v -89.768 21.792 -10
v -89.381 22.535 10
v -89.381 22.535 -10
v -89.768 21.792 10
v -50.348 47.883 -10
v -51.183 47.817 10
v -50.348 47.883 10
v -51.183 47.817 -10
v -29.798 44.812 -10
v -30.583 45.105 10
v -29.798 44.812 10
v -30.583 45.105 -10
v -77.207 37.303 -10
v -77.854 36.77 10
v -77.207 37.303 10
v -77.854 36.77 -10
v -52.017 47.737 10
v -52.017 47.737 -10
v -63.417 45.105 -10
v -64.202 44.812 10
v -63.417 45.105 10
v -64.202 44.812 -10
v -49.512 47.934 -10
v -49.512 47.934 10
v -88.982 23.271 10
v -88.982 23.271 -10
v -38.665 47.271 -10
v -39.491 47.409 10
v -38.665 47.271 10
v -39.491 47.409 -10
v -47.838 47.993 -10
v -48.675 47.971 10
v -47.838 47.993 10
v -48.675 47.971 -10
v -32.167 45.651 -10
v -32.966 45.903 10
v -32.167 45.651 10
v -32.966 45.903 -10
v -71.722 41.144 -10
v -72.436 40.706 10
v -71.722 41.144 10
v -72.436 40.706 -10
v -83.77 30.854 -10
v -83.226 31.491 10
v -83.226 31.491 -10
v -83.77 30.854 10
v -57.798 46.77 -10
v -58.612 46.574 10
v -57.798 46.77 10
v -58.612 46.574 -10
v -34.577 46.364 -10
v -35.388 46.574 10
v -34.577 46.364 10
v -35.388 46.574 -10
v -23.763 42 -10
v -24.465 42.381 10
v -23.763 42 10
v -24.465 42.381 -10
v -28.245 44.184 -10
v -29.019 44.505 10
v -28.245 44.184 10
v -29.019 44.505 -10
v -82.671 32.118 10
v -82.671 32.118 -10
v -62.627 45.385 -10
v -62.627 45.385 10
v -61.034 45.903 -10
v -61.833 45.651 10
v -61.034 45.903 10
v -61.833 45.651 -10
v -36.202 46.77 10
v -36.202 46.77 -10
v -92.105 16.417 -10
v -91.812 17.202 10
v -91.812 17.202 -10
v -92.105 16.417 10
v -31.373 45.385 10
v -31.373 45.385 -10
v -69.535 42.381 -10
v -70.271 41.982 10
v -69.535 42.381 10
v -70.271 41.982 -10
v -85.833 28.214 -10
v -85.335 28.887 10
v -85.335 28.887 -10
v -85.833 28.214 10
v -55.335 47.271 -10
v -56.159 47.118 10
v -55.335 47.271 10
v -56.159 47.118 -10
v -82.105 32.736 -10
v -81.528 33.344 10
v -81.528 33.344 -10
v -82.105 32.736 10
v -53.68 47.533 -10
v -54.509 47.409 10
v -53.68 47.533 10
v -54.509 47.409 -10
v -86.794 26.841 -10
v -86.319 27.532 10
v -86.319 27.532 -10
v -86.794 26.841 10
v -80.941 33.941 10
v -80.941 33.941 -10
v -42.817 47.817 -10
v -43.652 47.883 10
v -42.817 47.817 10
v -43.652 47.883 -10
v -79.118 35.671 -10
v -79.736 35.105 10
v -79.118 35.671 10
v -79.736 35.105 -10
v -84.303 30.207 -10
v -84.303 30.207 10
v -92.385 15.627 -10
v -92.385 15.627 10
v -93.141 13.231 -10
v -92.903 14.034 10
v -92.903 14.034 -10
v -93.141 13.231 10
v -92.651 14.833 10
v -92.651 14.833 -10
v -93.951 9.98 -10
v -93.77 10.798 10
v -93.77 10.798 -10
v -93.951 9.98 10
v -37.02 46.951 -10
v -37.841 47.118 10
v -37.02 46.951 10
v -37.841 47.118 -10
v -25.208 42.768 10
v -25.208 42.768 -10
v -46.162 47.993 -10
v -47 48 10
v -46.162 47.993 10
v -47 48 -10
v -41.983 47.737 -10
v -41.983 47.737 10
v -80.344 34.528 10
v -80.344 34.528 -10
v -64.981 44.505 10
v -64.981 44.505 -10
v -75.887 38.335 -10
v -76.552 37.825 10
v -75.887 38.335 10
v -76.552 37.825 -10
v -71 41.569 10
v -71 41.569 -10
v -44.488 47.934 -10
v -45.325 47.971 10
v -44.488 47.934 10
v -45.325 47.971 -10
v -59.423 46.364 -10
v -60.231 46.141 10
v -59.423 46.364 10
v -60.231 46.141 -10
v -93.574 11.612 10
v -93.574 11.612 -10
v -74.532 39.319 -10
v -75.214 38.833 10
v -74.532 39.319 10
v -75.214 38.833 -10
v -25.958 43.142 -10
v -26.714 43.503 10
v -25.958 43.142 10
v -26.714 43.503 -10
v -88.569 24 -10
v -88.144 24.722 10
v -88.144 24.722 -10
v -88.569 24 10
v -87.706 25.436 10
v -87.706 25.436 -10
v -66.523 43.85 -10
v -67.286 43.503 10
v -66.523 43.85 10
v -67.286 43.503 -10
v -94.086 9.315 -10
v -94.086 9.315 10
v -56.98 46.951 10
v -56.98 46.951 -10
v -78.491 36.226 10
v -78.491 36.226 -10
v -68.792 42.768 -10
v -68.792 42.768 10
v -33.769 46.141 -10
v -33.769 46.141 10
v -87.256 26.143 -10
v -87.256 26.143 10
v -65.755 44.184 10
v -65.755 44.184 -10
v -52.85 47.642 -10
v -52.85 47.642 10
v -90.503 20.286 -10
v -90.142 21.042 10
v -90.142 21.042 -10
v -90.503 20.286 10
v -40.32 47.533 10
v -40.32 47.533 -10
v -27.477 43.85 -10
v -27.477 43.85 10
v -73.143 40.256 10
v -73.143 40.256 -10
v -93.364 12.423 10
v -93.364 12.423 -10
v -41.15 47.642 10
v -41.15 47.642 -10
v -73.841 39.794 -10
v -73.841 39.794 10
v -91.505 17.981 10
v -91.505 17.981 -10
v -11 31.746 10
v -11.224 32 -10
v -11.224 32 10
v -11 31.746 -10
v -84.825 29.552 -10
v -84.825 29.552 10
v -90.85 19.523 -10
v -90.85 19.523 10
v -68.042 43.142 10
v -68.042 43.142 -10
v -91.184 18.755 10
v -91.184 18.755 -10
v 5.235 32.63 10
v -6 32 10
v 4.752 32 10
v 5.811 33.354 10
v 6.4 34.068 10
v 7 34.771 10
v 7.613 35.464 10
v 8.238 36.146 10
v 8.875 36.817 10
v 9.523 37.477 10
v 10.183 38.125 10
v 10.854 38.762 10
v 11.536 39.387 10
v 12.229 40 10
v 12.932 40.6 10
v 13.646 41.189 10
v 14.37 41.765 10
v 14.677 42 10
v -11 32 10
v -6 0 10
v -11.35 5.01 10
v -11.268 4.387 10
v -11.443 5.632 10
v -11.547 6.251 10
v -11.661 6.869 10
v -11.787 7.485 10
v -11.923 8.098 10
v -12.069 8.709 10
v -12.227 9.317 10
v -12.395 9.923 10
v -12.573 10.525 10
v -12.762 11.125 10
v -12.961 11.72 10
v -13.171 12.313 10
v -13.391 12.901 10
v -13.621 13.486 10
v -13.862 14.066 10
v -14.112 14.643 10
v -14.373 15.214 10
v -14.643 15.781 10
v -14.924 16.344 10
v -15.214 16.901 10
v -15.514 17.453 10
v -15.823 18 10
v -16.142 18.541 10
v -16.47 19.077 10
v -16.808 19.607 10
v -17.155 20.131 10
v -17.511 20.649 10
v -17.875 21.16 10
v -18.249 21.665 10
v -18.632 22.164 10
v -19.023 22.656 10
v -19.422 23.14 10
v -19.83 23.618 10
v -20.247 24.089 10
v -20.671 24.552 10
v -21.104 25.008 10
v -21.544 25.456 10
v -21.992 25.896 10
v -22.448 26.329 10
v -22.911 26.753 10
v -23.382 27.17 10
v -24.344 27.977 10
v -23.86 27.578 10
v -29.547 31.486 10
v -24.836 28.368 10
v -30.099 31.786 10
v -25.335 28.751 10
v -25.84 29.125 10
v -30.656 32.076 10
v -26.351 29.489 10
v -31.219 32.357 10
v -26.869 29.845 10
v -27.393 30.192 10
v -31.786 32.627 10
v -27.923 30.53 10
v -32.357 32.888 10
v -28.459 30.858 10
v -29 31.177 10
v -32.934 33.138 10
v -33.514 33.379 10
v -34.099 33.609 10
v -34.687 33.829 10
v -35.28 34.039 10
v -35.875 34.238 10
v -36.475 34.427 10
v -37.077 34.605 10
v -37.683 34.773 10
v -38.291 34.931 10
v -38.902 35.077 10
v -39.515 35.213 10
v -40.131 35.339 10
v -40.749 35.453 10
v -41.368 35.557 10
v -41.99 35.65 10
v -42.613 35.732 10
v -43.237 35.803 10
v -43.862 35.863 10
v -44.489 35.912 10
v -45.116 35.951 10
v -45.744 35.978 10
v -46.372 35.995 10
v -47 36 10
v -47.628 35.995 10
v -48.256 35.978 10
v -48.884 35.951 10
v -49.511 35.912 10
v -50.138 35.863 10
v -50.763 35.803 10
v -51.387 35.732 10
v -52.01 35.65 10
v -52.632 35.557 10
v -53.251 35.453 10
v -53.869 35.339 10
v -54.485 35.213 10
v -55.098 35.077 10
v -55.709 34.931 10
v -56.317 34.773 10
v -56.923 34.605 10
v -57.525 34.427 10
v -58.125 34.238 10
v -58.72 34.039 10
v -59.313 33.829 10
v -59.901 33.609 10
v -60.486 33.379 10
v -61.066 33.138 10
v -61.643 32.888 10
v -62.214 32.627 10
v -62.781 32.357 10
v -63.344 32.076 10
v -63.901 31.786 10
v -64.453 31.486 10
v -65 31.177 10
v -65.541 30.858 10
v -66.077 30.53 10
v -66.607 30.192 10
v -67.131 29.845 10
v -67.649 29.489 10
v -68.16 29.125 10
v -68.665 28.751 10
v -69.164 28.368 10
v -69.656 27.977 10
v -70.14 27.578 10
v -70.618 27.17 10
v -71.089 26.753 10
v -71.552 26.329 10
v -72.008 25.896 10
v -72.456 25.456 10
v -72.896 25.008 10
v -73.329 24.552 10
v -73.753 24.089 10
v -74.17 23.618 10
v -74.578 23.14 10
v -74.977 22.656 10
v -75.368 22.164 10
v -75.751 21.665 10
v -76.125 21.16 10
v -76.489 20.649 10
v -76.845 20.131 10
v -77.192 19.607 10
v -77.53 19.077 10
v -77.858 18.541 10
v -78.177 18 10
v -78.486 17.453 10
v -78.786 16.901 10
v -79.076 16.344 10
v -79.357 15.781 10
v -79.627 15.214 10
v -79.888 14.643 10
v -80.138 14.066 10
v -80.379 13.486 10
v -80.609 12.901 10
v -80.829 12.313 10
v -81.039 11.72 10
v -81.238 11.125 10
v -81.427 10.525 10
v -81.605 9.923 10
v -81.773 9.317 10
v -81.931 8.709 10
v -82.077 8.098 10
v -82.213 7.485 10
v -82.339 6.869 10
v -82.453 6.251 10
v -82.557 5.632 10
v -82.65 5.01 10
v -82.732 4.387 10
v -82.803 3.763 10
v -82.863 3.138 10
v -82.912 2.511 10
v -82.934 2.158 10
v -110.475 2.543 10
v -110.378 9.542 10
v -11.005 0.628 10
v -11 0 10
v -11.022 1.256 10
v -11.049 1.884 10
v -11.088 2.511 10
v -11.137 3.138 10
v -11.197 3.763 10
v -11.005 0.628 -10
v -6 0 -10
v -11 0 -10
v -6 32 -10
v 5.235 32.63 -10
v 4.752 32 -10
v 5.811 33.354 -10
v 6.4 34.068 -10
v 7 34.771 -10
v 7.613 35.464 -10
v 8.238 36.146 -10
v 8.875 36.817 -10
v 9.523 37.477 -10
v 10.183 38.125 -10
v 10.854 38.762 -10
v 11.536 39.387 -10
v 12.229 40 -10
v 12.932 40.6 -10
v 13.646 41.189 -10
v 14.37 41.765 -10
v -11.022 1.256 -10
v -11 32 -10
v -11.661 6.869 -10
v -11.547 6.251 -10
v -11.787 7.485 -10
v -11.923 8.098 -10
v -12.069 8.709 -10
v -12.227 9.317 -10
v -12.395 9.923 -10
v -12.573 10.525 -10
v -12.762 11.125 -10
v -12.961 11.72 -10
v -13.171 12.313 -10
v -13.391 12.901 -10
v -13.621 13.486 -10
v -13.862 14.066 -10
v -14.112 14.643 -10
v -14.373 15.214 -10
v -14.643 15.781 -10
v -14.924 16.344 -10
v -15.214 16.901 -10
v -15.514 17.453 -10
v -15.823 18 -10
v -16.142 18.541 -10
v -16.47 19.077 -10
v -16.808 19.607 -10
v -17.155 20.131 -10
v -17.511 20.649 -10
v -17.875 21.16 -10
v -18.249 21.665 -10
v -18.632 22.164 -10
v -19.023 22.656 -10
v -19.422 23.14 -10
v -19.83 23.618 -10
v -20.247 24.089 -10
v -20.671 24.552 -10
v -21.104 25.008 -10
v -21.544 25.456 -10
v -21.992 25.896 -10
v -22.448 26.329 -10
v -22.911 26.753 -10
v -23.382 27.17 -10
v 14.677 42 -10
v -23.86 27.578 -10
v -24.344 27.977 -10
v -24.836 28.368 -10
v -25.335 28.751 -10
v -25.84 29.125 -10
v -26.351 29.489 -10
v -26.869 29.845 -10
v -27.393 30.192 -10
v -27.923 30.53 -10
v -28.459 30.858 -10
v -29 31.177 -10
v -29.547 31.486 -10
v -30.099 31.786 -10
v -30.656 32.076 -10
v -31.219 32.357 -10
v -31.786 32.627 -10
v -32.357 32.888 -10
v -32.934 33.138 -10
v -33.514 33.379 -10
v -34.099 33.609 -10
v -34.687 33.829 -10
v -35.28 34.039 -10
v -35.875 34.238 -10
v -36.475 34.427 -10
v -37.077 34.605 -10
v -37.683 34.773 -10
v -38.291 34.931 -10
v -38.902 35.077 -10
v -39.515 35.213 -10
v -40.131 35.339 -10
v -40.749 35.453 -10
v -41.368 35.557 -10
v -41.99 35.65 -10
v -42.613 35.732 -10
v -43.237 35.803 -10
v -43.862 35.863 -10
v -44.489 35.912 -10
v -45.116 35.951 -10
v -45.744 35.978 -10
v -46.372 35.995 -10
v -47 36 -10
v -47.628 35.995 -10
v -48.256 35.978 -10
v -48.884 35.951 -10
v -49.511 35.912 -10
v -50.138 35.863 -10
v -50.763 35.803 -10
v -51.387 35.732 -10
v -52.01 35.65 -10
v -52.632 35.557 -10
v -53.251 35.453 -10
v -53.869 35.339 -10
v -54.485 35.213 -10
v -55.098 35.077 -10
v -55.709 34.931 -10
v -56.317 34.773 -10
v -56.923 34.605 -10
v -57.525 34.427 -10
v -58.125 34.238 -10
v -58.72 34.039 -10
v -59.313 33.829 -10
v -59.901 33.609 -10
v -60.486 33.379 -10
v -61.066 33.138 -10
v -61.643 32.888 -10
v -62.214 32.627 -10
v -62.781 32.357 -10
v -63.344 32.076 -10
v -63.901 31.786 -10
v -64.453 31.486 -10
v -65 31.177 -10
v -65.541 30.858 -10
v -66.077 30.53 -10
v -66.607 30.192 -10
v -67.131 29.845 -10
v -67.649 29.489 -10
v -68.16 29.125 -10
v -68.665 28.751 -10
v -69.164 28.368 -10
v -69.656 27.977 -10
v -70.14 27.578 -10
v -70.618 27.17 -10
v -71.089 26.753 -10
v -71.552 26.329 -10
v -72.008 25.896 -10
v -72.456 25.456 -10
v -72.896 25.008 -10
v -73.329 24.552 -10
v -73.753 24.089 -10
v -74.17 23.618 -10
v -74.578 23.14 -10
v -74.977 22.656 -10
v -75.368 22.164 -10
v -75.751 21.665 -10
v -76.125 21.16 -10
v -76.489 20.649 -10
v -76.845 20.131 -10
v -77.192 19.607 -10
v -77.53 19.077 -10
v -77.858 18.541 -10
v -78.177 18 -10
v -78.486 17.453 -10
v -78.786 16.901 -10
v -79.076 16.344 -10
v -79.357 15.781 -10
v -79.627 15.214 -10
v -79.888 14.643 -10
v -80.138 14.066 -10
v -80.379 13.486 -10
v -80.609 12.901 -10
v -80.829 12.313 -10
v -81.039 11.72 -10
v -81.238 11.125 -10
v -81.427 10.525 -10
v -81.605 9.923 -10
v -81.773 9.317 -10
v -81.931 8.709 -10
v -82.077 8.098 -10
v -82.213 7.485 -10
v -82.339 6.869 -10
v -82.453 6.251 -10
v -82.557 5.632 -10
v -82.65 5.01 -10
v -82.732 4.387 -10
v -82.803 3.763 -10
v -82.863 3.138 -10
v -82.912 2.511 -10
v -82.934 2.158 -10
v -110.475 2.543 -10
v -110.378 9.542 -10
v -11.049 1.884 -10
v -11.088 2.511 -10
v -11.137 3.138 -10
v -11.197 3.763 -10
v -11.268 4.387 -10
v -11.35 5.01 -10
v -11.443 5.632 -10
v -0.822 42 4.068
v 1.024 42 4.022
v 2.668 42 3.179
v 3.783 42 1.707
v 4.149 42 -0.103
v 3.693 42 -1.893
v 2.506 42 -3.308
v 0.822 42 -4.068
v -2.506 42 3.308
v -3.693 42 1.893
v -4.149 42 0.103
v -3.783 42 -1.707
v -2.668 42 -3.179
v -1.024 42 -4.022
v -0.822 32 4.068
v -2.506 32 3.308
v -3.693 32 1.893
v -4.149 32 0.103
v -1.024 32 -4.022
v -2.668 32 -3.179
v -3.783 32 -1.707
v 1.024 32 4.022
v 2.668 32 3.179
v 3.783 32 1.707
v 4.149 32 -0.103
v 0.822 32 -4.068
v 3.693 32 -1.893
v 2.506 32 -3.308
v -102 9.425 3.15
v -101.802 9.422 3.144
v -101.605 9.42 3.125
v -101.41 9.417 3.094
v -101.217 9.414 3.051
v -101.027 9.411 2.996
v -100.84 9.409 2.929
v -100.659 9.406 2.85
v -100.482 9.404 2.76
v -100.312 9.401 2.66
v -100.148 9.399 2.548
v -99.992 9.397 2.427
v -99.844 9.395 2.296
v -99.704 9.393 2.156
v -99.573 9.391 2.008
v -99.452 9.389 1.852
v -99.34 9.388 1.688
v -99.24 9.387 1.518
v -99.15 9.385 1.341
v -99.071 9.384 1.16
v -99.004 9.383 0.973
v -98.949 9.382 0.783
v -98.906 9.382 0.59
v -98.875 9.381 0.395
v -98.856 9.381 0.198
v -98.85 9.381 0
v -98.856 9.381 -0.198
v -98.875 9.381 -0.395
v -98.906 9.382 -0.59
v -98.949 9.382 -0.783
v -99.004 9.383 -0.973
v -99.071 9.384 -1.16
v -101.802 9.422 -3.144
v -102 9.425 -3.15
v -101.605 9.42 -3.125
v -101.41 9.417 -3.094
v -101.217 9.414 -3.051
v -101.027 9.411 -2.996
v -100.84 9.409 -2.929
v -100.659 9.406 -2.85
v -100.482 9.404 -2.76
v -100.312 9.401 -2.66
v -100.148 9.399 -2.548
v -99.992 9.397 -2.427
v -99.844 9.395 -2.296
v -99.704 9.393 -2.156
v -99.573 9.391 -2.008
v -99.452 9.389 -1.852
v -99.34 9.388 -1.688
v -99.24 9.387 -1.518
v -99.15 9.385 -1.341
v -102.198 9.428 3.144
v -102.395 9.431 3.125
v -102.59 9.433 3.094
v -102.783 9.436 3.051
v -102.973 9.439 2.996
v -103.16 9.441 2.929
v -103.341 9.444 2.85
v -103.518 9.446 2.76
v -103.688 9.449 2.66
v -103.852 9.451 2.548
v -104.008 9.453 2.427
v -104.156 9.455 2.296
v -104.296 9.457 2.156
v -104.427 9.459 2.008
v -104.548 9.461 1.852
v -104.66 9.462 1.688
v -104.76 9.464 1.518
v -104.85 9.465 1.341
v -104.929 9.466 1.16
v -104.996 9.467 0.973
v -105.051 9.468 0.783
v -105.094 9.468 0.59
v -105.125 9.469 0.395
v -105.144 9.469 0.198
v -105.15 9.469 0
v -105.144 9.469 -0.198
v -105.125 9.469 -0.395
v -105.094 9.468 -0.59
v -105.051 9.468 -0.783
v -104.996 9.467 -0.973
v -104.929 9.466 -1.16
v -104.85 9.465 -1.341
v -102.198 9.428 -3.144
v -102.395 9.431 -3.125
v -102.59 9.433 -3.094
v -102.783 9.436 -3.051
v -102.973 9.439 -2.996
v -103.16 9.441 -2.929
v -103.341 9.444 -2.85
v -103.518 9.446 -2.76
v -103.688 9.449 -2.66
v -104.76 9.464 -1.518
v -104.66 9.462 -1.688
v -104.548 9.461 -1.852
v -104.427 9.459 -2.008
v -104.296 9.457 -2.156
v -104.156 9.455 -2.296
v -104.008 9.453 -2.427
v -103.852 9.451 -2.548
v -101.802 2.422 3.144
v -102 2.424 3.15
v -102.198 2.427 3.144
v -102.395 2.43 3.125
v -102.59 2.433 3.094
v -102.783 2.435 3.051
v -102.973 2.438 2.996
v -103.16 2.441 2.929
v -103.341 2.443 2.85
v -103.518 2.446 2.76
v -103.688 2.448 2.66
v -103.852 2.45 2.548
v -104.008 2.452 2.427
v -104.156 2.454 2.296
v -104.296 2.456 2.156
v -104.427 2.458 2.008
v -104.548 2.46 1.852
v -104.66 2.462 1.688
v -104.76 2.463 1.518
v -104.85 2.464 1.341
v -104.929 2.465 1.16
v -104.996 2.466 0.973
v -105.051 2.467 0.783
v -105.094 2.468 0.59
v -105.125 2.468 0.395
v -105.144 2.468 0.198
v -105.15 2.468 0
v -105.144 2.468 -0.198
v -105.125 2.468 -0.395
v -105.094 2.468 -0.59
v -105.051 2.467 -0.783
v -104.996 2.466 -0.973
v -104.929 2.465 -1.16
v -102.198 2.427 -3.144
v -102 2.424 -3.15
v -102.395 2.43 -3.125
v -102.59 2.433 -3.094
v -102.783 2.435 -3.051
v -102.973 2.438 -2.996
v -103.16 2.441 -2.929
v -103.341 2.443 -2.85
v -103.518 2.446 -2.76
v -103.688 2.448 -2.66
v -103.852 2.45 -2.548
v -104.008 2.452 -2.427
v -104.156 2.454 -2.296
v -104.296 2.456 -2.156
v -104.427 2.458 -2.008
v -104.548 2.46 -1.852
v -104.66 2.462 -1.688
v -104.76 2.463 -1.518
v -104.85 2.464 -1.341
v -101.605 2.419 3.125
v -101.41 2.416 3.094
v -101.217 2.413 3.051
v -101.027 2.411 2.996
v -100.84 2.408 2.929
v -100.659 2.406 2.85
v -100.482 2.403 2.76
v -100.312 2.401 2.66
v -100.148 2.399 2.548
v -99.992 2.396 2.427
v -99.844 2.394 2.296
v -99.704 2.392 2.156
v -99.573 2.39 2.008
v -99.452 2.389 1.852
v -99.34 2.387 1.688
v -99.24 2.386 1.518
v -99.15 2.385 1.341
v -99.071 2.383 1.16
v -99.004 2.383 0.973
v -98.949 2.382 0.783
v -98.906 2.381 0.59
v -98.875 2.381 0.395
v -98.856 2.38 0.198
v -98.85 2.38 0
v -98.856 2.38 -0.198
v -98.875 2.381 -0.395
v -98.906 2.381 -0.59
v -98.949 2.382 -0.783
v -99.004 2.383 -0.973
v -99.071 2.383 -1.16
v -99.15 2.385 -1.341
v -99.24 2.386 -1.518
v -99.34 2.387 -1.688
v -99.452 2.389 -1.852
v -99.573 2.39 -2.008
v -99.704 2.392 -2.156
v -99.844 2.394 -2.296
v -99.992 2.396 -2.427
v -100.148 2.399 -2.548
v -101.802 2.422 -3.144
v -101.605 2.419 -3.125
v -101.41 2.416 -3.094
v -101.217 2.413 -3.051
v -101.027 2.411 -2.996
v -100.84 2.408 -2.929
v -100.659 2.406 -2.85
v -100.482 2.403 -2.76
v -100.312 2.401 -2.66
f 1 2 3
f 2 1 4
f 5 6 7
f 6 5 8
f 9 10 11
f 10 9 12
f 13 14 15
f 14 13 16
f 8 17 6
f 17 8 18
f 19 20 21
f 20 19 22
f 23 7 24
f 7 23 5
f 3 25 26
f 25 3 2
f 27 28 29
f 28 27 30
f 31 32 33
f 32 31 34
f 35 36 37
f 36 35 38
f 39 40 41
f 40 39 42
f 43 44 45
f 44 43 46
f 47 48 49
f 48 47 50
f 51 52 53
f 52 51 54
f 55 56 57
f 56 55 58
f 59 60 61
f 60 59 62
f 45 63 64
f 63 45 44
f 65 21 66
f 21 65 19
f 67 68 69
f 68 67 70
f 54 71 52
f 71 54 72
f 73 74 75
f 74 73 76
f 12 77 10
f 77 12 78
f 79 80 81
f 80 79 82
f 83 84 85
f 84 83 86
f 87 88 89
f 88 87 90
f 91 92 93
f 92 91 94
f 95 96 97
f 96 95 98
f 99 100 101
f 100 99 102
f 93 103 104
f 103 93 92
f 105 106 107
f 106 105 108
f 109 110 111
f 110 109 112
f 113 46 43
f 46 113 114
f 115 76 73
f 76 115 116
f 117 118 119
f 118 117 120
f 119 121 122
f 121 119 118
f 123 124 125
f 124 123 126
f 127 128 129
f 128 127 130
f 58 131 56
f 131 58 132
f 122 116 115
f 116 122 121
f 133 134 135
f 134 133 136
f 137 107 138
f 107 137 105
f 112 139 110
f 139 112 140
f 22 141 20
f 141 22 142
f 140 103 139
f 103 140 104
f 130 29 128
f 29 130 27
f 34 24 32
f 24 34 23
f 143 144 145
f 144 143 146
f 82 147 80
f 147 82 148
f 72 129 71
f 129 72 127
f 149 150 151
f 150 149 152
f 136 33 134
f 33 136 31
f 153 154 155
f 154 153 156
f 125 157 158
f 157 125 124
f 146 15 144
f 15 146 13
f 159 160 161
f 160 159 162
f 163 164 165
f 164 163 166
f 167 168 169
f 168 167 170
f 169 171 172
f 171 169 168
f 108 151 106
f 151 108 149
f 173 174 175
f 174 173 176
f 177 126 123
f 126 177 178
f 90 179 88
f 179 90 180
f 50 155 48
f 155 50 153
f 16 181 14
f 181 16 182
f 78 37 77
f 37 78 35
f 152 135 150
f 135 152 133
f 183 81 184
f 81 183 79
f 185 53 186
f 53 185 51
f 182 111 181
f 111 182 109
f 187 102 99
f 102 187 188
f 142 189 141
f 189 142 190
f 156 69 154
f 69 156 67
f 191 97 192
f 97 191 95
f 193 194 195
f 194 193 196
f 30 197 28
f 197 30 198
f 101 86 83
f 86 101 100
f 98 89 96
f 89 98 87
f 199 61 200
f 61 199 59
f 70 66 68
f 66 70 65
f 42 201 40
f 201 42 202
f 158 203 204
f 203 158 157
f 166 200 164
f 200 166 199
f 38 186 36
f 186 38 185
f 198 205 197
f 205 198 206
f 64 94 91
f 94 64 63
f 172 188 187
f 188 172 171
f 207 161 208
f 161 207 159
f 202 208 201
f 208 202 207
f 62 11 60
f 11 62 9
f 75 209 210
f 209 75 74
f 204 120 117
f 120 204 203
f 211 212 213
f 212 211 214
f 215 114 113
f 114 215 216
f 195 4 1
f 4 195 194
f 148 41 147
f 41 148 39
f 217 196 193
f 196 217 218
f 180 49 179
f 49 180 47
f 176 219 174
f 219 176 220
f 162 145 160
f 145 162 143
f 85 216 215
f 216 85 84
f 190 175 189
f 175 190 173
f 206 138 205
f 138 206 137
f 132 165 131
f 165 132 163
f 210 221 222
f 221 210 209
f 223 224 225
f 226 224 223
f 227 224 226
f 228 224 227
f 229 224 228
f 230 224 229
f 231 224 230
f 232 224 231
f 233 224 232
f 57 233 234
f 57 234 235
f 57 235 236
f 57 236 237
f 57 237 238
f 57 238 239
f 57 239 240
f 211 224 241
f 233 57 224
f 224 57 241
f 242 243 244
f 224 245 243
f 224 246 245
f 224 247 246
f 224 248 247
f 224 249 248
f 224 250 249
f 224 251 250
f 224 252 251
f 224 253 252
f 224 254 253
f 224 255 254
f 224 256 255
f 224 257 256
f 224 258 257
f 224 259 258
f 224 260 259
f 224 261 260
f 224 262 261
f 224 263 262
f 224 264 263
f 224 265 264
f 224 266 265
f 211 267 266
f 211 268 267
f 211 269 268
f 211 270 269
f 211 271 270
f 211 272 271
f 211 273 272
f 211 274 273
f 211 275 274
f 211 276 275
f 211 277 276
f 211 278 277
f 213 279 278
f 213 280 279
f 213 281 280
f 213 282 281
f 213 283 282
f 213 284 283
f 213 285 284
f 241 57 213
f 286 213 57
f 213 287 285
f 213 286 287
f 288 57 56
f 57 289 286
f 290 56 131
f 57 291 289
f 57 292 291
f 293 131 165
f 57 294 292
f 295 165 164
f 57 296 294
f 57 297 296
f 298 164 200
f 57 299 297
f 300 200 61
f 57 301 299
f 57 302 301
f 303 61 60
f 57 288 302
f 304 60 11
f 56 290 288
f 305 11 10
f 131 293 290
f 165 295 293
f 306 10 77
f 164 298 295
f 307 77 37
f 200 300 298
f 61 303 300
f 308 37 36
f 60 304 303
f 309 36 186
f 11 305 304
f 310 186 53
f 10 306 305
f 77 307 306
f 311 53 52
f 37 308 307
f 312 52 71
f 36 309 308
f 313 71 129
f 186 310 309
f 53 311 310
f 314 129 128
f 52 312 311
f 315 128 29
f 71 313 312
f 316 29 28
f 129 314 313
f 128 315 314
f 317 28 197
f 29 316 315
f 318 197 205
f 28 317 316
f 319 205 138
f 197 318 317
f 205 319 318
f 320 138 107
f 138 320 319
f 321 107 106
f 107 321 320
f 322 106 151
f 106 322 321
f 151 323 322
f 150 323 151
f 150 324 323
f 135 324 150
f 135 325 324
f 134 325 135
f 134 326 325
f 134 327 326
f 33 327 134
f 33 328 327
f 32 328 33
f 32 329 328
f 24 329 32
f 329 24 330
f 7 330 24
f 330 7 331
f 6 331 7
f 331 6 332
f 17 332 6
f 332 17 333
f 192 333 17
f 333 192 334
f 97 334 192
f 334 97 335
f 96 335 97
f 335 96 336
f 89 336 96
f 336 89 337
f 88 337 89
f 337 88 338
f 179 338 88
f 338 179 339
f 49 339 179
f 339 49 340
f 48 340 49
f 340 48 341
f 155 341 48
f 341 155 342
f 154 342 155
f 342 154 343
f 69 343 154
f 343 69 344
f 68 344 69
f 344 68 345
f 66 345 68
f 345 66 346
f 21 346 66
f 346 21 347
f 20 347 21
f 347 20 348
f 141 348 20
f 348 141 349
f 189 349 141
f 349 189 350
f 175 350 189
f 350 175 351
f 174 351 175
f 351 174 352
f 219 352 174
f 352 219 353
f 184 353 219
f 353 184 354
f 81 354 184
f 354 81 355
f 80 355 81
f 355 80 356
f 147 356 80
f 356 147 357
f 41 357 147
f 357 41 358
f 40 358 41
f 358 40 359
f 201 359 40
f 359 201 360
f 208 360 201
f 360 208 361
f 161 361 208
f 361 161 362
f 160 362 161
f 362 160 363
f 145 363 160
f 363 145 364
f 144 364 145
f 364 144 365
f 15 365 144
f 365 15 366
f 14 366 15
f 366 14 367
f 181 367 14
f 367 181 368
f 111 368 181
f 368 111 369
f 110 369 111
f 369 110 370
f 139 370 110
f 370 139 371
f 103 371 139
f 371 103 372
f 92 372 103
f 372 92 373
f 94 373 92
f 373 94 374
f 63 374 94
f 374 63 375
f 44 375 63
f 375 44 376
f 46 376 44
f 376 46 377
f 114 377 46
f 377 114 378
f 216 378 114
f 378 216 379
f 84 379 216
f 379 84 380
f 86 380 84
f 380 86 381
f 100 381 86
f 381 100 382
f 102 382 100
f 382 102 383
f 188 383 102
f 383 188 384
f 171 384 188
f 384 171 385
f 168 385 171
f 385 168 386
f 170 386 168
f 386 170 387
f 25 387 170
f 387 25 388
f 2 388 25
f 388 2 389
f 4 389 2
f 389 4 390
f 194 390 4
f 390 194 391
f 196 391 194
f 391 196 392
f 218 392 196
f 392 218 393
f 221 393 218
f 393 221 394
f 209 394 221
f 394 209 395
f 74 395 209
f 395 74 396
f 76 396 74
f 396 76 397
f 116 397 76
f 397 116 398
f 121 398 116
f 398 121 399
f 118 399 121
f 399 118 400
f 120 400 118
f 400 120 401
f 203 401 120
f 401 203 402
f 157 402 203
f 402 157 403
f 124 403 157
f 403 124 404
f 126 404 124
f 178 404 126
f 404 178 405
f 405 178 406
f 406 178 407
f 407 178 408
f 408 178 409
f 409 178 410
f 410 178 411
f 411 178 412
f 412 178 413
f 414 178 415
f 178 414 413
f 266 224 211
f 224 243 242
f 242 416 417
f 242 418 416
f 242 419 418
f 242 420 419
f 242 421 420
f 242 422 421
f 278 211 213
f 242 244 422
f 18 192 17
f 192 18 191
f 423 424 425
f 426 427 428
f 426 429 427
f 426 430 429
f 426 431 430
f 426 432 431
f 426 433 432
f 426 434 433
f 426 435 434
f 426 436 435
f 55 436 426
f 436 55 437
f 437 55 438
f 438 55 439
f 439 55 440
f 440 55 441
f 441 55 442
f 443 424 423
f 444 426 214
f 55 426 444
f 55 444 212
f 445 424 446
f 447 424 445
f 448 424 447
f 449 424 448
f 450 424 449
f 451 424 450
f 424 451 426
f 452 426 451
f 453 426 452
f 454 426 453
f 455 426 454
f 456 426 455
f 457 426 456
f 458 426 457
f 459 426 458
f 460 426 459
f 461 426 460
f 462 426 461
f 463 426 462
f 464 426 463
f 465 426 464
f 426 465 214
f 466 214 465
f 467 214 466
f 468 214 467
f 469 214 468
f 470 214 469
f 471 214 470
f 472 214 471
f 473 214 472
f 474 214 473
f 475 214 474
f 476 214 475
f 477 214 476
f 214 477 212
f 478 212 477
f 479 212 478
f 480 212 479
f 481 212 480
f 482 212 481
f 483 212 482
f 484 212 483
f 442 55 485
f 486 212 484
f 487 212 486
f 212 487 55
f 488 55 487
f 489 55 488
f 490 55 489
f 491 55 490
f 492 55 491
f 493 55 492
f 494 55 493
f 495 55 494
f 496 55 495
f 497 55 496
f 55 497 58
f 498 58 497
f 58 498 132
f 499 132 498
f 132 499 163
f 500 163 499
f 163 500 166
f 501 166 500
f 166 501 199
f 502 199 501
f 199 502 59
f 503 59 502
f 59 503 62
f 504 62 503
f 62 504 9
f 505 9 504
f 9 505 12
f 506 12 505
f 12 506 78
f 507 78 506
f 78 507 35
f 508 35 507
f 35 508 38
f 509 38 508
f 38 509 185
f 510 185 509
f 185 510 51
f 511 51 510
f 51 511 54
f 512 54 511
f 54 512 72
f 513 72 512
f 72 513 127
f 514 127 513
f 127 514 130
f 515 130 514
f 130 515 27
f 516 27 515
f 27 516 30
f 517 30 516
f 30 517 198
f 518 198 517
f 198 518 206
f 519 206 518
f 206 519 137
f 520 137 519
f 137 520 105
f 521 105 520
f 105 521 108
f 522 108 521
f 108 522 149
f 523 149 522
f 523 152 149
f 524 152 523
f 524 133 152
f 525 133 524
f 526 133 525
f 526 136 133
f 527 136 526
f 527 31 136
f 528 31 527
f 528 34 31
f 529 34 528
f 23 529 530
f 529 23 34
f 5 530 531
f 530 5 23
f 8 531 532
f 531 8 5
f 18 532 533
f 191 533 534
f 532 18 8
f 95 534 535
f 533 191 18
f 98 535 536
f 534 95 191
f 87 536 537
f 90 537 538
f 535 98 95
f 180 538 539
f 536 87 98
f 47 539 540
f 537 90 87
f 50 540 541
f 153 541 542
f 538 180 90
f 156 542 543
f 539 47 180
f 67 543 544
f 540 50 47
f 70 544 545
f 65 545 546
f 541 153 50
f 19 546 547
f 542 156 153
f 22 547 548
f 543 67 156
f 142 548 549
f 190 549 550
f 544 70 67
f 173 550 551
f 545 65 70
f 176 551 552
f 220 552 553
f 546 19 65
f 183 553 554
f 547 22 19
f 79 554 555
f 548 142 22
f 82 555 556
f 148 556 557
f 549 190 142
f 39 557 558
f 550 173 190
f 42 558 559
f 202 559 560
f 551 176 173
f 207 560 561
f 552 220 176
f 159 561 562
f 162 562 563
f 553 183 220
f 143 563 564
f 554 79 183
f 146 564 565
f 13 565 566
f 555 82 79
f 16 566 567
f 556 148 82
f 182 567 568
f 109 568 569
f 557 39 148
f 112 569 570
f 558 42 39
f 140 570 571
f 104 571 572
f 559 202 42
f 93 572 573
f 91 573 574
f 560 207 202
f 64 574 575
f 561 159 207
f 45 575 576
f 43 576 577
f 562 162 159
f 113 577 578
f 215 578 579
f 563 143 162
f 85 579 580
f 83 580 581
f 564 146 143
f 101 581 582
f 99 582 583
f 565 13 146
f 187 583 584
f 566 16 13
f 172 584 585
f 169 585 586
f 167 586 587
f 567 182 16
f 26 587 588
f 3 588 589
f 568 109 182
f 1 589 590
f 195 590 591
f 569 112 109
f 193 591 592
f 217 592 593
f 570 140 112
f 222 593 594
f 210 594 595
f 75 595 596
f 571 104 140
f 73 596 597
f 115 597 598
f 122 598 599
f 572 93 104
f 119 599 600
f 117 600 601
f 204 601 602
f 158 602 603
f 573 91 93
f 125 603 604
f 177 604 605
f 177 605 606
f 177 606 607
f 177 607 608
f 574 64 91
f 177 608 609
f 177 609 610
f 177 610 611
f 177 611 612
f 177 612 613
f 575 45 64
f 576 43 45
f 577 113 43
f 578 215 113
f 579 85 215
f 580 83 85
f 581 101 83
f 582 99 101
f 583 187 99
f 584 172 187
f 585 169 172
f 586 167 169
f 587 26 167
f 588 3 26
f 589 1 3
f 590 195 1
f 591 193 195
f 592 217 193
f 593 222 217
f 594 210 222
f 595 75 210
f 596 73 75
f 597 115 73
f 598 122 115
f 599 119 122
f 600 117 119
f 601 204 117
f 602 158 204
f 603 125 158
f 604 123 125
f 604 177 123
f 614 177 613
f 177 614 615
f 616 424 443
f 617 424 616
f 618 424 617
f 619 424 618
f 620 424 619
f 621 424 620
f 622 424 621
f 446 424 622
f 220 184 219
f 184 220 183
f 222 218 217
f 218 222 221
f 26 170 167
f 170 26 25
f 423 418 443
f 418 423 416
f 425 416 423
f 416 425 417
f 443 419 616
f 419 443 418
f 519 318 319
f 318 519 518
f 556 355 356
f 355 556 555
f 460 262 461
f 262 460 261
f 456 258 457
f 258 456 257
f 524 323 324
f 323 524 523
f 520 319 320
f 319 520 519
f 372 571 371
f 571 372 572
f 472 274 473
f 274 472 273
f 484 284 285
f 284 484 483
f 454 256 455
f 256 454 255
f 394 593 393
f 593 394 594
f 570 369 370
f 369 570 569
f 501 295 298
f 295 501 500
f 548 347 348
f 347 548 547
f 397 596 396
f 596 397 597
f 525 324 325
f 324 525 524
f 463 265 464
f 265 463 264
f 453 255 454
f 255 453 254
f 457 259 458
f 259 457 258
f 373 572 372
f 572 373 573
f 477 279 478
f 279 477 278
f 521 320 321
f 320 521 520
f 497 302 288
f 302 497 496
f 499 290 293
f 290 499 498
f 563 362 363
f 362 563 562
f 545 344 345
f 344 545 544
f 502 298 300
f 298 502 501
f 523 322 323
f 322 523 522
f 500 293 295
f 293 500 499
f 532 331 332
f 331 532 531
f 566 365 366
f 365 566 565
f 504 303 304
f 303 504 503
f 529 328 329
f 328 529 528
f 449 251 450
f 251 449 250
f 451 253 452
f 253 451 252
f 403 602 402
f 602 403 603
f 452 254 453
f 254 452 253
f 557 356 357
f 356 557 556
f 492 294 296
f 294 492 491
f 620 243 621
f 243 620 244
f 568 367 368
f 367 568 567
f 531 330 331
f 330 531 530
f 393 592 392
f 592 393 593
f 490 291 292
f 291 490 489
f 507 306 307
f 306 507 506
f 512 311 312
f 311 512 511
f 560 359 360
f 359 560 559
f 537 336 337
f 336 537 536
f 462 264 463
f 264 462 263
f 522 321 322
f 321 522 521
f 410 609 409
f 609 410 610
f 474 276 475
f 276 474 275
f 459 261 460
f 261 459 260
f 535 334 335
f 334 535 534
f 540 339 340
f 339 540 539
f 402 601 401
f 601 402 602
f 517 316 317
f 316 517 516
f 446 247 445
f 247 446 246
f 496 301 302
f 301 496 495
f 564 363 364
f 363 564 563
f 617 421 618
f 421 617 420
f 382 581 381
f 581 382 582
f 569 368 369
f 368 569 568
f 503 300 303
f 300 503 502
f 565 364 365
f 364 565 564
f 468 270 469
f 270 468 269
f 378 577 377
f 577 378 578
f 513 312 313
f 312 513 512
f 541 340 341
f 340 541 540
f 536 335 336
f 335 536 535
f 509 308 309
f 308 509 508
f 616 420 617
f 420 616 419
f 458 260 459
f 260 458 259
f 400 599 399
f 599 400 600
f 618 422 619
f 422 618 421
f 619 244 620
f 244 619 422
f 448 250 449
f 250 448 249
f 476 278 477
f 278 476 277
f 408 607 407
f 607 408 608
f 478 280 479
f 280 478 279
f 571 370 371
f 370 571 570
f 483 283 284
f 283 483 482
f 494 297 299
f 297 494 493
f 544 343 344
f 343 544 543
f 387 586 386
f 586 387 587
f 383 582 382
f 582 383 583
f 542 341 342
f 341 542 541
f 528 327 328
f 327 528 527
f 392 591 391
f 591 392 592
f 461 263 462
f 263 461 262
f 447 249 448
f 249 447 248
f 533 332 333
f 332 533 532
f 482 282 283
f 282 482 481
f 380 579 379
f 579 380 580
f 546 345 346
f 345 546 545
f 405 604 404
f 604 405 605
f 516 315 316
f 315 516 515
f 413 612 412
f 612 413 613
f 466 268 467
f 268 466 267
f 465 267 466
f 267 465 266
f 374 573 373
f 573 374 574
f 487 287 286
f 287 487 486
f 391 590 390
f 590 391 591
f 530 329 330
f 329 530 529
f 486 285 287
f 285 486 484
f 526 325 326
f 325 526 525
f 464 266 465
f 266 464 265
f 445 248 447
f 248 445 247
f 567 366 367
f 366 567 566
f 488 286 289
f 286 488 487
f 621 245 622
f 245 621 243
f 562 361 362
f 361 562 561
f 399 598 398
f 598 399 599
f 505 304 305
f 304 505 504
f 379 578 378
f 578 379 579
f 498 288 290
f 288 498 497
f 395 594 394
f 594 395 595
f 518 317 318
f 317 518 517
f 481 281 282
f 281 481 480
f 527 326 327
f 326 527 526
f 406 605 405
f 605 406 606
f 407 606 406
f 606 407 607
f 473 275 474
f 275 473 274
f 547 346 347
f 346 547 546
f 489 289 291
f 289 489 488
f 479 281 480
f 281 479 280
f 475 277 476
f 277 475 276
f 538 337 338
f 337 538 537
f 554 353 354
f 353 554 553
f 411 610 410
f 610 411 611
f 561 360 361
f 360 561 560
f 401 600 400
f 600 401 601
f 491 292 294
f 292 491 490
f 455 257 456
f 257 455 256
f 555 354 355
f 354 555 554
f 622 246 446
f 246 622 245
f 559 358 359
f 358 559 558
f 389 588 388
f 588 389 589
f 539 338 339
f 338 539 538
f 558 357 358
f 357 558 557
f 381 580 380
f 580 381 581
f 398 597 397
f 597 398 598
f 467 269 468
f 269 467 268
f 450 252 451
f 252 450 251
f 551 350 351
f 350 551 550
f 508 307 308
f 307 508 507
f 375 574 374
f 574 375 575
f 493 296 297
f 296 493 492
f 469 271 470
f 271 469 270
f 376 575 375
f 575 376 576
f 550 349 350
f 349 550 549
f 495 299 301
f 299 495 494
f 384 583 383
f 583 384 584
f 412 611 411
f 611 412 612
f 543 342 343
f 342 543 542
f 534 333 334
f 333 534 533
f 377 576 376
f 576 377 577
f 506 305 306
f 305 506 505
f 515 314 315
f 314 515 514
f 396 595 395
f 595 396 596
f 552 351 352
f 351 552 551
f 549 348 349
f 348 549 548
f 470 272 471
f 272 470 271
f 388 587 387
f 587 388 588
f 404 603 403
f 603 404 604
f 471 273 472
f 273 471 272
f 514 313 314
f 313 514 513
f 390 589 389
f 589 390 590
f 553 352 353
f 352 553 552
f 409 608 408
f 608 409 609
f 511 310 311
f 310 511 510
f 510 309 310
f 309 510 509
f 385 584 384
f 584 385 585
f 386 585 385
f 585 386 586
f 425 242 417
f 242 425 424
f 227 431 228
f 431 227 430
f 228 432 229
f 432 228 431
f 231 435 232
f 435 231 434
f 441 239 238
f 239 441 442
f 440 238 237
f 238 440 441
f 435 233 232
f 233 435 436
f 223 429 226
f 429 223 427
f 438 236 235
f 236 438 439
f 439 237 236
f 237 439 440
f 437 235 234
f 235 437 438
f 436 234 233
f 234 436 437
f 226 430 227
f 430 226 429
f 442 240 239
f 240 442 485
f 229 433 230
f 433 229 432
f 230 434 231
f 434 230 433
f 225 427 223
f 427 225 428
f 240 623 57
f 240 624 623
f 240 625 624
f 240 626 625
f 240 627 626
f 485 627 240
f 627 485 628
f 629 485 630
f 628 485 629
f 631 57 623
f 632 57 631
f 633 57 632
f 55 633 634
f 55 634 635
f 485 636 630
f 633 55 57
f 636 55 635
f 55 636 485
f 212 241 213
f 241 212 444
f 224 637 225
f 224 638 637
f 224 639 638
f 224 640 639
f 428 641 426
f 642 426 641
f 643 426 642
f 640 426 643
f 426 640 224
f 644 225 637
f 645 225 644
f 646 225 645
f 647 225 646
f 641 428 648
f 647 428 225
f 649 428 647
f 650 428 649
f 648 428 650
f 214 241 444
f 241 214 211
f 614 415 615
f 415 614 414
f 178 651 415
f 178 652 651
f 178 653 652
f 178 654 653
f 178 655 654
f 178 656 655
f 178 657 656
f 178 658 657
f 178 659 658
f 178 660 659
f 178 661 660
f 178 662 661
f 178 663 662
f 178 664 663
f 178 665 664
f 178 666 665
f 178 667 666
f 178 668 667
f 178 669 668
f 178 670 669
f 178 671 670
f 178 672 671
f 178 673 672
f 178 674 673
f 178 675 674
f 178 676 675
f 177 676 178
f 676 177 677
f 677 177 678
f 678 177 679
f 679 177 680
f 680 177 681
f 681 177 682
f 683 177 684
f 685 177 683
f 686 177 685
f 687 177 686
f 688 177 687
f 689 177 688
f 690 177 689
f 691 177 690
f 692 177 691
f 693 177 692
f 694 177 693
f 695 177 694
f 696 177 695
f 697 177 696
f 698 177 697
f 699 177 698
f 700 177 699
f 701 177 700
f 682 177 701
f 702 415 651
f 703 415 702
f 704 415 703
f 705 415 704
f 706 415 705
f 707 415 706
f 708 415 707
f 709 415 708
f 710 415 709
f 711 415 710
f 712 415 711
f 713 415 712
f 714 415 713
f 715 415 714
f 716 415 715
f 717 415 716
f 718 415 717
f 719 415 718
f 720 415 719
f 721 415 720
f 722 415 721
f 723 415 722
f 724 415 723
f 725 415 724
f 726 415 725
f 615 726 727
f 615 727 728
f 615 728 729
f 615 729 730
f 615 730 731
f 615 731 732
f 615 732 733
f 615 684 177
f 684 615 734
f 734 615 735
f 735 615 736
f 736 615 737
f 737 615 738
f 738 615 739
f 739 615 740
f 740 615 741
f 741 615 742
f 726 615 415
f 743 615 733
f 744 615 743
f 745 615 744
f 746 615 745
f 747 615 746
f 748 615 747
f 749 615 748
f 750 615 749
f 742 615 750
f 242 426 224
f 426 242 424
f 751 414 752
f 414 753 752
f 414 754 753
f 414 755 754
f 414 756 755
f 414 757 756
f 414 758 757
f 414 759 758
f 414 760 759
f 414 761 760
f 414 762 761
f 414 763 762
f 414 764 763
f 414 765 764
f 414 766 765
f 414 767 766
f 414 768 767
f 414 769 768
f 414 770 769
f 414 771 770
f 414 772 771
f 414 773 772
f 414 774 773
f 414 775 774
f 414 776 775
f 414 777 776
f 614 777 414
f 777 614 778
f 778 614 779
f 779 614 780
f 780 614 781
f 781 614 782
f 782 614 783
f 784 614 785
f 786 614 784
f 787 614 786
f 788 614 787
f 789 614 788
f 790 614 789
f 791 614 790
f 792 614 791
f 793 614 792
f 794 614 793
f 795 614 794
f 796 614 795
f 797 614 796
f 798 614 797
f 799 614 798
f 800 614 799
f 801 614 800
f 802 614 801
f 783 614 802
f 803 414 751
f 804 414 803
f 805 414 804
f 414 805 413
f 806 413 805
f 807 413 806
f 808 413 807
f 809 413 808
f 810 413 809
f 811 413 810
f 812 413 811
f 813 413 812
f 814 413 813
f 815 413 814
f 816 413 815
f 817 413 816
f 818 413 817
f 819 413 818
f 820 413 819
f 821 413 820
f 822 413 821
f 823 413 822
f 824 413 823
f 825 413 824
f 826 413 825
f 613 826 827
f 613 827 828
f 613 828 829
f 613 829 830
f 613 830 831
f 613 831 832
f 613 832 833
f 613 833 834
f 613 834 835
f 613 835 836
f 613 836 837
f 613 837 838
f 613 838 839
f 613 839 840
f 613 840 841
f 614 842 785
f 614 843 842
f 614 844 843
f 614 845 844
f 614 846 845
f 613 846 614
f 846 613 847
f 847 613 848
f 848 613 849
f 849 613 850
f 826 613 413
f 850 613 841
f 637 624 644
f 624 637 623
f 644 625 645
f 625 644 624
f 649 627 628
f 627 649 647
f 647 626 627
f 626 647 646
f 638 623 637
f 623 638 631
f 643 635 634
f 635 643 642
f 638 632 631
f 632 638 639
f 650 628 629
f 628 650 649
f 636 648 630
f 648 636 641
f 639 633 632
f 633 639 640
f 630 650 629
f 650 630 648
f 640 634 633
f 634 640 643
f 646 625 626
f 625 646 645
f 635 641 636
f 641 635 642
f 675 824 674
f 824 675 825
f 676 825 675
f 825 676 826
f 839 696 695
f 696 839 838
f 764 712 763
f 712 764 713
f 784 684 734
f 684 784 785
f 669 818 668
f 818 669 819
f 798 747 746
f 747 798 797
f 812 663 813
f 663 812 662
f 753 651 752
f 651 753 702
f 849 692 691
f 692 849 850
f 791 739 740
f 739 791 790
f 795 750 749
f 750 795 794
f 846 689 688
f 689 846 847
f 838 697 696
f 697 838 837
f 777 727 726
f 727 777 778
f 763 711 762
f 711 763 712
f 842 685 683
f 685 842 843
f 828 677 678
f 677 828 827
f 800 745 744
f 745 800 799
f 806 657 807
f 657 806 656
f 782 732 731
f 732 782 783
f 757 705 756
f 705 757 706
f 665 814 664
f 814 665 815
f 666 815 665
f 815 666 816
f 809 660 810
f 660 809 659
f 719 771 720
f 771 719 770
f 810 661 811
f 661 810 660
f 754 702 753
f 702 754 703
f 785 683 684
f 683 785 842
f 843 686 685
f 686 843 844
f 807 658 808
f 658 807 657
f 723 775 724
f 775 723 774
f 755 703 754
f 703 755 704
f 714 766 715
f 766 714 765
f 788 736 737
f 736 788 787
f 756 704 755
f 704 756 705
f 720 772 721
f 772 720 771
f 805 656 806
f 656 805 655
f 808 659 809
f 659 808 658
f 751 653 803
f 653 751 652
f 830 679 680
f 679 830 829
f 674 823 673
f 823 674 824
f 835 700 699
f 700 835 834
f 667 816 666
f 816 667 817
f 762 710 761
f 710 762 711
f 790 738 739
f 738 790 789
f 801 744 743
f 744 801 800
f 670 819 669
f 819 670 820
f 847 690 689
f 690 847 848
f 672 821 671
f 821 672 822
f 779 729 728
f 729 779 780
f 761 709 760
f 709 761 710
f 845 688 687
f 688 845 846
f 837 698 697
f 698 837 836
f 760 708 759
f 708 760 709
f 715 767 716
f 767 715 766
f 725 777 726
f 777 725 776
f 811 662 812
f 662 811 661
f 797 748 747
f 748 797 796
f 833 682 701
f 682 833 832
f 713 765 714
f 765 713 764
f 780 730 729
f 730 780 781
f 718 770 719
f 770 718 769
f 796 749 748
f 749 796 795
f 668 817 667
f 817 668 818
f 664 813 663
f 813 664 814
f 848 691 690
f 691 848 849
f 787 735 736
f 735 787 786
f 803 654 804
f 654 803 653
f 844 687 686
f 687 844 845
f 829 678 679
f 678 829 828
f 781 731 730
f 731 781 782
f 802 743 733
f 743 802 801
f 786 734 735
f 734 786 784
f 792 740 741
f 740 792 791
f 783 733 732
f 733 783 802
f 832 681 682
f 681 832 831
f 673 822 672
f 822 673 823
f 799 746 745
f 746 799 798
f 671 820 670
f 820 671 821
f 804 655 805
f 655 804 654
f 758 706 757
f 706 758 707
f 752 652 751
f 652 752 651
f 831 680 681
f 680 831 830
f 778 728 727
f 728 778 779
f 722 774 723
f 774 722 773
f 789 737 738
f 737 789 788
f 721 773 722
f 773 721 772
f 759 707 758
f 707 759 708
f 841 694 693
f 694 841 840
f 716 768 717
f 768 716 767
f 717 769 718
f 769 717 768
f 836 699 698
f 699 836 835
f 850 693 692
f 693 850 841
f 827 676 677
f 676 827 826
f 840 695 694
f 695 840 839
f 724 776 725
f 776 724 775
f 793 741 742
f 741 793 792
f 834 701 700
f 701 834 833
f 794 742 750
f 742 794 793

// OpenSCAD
inner_d1 = 72;
outer_d1 = 96;

inner_d2 = 82;
outer_d2 = 106;

height = 20;
screw_d=6.3;
screw_cent_d=8.3;

nib_x = 27;
nib_y = 8;

ring_xsp1 = -1;
rad_x = (outer_d1/2) + ring_xsp1;
ring_xsp2 = rad_x - (outer_d2/2);

brace_thick = 12;
inner_xpos1 = (outer_d1-inner_d1)/2+ring_xsp1/2+inner_d1;
inner_xpos2 = (outer_d2-inner_d2)/2+ring_xsp2/2+inner_d2;

// center cube1
ccube_x1 = (outer_d1-inner_d1)/2+(outer_d2-inner_d2)/2 + ring_xsp1 + ring_xsp2;
ccube_y1 = 32;

// center cube2
ccube_foot = 5;
ccube_x2 = ccube_x1-5;
ccube_y2 = ccube_y1;

// brim cube
bcube_x=40;
bcube_y=10;

hole_x = (outer_d1 + ring_xsp1/2) + (nib_x-(outer_d1-inner_d1)/2)/2-1;

module Create_Cylinder(d=100,h=25,a=360){
rotate_extrude(angle=a,$fn = 50) {polygon( points=[[0,-h/2],[d/2,-h/2],[d/2,h/2],[0,h/2]] );}
}

module ring1() {
    difference() {
                cylinder(d=outer_d1, h=height, center=true, $fn=360);
                cylinder(d=inner_d1, h=height+1, center=true, $fn=360);
                translate([-outer_d1/2, -(outer_d1+2)/2, -(height+2)/2]) 
                    cube([outer_d1,(outer_d1+2)/2,height+2]);
            }    
}

module ring2() {
    difference() {
                cylinder(d=outer_d2, h=height, center=true, $fn=360);
                cylinder(d=inner_d2, h=height+1, center=true, $fn=360);
            }    
}

difference() {
    union() {
        translate([-outer_d1/2-ring_xsp1, 0, 0]) ring1();
        // center cube
        translate([-(outer_d1-inner_d1)/2-ring_xsp1, 0, -height/2]) cube([ccube_x1,ccube_y1,height]);
        difference() {
            translate([-25, 32, -height/2]) cube([bcube_x,bcube_y,height]);
            translate([outer_d2/2+ring_xsp2, 0, 0]) ring2();
        }
        // nib
        rotate([0, 0, -0.8]) translate([-inner_xpos1-nib_x, 0, -height/2]) cube([nib_x,nib_y,height]);
    }
    translate([-(outer_d1-inner_d1)/2-ring_xsp1+ccube_foot, 0, -height/2]) cube([ccube_x2,ccube_y2,height]);
    // nib bottom spacing
    rotate([0, 0, -0.8]) translate([-111, -10, -height/2]) cube([nib_x+4,nib_y+3,height]);
    translate([0, 50, 0]) rotate([90, -50, 0]) cylinder(d=screw_cent_d, h=100);
    translate([hole_x+9, 15, 0]) rotate([90, 0, 0]) cylinder(d=screw_d, h=nib_y*2, $fn=100);
    translate([-hole_x, 15, 0]) rotate([90, 0, 0]) cylinder(d=screw_d, h=nib_y*2, $fn=100);
}
